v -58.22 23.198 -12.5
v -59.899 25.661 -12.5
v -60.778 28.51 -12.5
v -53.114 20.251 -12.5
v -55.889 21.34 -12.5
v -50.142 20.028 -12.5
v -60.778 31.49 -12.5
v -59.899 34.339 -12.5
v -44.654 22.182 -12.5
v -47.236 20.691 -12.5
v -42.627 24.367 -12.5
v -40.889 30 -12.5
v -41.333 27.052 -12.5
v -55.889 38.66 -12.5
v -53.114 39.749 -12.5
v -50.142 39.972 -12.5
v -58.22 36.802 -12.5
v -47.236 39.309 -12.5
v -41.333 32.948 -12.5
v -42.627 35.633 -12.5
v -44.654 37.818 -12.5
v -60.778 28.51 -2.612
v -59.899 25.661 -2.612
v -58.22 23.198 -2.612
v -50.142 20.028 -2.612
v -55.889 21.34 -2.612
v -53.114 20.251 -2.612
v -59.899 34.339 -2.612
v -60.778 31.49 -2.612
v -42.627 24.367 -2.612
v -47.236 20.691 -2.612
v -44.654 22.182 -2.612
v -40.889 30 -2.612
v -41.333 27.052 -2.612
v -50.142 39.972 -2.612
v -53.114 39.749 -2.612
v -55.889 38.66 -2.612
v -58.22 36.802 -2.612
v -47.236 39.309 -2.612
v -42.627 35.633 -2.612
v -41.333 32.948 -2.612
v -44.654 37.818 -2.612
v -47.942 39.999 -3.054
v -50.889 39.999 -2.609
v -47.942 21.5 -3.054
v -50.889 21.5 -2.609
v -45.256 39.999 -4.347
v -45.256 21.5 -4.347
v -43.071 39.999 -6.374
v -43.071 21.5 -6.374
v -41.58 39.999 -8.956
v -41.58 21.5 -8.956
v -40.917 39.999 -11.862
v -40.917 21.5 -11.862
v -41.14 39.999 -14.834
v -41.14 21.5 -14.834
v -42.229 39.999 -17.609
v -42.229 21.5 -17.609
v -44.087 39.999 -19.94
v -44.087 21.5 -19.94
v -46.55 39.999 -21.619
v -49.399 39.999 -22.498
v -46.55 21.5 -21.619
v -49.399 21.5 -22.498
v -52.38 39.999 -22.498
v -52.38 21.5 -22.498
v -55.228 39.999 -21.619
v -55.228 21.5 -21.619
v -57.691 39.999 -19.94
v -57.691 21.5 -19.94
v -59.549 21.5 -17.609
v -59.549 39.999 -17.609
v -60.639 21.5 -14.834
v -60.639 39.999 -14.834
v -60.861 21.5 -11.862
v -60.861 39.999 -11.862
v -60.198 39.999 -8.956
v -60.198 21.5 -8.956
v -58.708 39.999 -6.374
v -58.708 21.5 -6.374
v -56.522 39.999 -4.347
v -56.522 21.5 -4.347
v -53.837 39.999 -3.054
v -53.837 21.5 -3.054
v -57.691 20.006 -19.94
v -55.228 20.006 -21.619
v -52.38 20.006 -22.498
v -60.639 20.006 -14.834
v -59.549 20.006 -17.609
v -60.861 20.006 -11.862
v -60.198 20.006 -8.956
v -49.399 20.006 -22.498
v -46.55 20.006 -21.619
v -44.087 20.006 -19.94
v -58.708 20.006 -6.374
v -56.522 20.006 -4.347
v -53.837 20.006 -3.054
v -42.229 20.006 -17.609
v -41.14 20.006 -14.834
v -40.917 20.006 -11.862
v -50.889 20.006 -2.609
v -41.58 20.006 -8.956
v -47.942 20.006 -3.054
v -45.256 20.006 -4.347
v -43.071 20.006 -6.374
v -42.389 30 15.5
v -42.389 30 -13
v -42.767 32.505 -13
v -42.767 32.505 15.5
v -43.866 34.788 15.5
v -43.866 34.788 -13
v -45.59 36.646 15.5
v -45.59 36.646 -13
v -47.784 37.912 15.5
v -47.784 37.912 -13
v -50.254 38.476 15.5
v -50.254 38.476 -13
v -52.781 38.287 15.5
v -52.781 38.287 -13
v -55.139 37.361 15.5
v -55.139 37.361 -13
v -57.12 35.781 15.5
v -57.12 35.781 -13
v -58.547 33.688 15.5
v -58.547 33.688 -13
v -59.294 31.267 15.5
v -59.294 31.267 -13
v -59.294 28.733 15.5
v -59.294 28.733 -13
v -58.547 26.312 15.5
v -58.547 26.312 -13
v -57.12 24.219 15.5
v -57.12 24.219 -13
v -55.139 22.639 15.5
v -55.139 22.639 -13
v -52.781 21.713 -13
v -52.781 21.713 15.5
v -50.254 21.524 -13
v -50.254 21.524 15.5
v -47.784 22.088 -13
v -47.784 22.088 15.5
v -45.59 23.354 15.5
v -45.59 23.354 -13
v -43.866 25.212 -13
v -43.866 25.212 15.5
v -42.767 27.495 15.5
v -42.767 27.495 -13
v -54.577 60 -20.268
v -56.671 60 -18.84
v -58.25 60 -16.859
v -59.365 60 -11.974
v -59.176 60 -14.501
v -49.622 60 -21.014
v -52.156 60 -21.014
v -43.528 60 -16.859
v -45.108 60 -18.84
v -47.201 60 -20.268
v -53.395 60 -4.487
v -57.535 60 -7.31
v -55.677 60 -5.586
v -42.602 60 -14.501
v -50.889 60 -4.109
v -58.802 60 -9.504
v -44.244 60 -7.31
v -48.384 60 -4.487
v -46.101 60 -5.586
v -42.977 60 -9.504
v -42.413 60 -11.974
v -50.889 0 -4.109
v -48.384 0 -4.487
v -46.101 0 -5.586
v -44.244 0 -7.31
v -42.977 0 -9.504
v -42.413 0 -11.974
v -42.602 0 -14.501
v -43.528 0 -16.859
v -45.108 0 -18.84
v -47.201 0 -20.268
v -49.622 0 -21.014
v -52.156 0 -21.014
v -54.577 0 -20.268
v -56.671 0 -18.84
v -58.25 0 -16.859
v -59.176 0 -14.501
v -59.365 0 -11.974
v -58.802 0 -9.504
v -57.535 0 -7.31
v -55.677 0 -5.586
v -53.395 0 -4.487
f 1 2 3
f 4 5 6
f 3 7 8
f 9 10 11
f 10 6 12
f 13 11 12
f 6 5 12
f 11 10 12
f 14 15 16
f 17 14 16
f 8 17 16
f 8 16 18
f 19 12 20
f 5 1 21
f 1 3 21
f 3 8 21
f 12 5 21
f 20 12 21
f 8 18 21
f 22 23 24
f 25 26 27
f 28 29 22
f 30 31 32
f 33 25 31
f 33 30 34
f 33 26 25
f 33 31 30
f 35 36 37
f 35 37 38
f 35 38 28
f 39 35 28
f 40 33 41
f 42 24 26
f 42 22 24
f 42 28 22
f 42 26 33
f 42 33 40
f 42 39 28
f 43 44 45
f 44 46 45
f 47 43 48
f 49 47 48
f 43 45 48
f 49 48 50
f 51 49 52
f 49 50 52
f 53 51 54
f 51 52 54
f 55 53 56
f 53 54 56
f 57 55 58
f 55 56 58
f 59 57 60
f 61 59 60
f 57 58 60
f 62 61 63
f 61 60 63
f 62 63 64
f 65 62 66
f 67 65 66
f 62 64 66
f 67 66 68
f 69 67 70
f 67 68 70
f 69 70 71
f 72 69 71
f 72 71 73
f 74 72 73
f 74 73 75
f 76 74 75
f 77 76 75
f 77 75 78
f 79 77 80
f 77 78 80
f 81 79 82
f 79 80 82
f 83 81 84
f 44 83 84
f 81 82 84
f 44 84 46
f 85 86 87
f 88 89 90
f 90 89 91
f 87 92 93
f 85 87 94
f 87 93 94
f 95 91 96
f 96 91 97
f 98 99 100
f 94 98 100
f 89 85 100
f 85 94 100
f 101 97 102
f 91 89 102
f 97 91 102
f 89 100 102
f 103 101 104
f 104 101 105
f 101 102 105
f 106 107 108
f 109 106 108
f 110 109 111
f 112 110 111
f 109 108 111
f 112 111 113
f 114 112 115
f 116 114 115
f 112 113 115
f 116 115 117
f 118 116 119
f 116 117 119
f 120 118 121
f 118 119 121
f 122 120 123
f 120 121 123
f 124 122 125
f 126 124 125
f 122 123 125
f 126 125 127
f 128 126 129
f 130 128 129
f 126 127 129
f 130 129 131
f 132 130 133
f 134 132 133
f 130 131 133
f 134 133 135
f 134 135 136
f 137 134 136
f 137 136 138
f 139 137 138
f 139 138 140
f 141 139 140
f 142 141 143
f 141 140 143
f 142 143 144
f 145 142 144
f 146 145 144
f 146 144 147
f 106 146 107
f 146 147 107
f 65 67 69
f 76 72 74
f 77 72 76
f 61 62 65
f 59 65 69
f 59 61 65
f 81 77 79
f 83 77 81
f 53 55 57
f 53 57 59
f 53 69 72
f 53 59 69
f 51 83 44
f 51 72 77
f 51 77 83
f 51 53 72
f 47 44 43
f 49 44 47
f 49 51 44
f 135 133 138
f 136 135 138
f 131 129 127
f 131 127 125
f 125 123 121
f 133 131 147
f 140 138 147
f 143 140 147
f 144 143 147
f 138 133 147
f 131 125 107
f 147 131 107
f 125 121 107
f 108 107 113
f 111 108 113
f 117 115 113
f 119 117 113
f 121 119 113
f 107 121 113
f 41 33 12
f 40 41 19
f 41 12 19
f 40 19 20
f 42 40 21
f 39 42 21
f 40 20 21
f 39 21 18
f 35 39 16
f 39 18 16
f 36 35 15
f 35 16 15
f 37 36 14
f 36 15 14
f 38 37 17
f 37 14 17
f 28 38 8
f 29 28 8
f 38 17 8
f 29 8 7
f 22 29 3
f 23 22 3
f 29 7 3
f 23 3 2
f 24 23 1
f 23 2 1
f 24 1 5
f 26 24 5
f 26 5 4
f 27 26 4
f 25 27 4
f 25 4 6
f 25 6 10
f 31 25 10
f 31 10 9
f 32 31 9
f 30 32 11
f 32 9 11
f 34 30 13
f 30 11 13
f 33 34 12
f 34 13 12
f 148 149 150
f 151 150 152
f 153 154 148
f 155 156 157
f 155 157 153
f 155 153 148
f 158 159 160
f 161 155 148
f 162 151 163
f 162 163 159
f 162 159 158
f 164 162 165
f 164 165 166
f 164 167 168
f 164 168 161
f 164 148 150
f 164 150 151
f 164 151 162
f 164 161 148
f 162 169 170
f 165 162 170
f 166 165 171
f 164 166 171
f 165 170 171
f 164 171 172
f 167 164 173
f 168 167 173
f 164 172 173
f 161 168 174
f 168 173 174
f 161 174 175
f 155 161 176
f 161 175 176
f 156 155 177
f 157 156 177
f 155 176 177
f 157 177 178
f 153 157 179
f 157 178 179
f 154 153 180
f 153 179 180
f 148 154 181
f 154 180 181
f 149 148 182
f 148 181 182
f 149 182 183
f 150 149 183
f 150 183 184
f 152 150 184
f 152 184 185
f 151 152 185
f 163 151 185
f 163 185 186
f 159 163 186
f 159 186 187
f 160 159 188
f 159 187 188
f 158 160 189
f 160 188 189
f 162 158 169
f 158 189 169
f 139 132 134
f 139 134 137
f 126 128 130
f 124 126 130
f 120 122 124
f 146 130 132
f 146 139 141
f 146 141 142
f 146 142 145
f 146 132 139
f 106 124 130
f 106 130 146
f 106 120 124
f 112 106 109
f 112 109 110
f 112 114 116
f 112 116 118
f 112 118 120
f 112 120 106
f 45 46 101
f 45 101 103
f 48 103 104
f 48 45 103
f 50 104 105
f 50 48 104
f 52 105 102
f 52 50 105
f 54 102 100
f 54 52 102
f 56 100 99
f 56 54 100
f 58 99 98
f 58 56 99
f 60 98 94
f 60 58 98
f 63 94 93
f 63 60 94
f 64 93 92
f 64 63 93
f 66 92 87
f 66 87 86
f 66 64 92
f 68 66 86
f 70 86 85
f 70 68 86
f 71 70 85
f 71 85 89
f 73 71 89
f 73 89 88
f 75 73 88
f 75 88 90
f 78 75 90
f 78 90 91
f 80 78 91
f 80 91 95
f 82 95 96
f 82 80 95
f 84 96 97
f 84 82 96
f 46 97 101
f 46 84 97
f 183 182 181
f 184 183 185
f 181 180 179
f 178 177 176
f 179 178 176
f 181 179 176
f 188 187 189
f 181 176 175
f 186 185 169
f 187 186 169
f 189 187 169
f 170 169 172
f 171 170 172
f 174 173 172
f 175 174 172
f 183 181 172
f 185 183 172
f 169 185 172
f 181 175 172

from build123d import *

# Parameters (mm, degrees)
SKETCH1_R                 = 8.5
BOSS_EXTRUDE9_DEPTH       = 60
BOSS_EXTRUDE10_DEPTH      = 15.5
BOSS_EXTRUDE10_DEPTH_BACK = 13
SKETCH2_R                 = 8.5
BOSS_EXTRUDE11_DEPTH      = 0.0001
BOSS_EXTRUDE11_DEPTH_BACK = 38.5
SKETCH3_R                 = 10
MOVE_FACE1_BY             = 20.2
BOSS_EXTRUDE12_DEPTH      = 0.0001
BOSS_EXTRUDE12_DEPTH_BACK = 28
SKETCH4_R                 = 10
MOVE_FACE2_BY             = 18.6
MOVE_FACE3_BY             = 0.198659162
MOVE_FACE4_BY             = 1.493864333
MOVE_FACE6_BY             = 0.604242716
MOVE_FACE7_BY             = 0.11593398


with BuildPart() as part:
    # Sketch1 → Boss-Extrude9 (new body)
    with BuildSketch(Plane(origin=(0, 0, 0), x_dir=(1, 0, 0), z_dir=(0, 1, 0))):
        with Locations(Location((-50.889224798, 12.609280988, 0), (0, 0, 270))):
            Circle(SKETCH1_R)
    extrude(amount=BOSS_EXTRUDE9_DEPTH)


with BuildPart() as body_2:
    # Sketch2 → Boss-Extrude10 (new, two sides: drawn at the far end of the back side and taken through both)
    with BuildSketch(Plane.XY.offset(-BOSS_EXTRUDE10_DEPTH_BACK)):
        with Locations((-50.889224798, 30)):
            Circle(SKETCH2_R)
    extrude(amount=BOSS_EXTRUDE10_DEPTH + BOSS_EXTRUDE10_DEPTH_BACK)


with BuildPart() as body_3:
    # Sketch3 → Boss-Extrude11 (new, two sides: drawn at the far end of the back side and taken through both)
    with BuildSketch(Plane(origin=(0, 60, 0), x_dir=(1, 0, 0), z_dir=(0, 1, 0)).offset(-BOSS_EXTRUDE11_DEPTH_BACK)):
        with Locations(Location((-50.889224798, 12.609280988, 0), (0, 0, 270))):
            Circle(SKETCH3_R)
    extrude(amount=BOSS_EXTRUDE11_DEPTH + BOSS_EXTRUDE11_DEPTH_BACK)

    # Move Face1: a face moved inward by 20.2
    extrude(body_3.faces().sort_by_distance((-50.889224798, 60.0001, -12.609280988))[0], amount=MOVE_FACE1_BY, dir=(0, -1, 0), mode=Mode.SUBTRACT)

    # Move Face3: a face moved outward by 0.198659
    extrude(body_3.faces().sort_by_distance((-50.889224798, 39.8001, -12.609280988))[0], amount=MOVE_FACE3_BY, dir=(0, 1, 0))

    # Move Face4: a face moved outward by 1.493864
    extrude(body_3.faces().sort_by_distance((-50.889224798, 21.5, -12.609280988))[0], amount=MOVE_FACE4_BY, dir=(0, -1, 0))


with BuildPart() as body_4:
    # Sketch4 → Boss-Extrude12 (new, two sides: drawn at the far end of the back side and taken through both)
    with BuildSketch(Plane.XY.offset(15.5).offset(-BOSS_EXTRUDE12_DEPTH_BACK)):
        with Locations((-50.889224798, 30)):
            Circle(SKETCH4_R)
    extrude(amount=BOSS_EXTRUDE12_DEPTH + BOSS_EXTRUDE12_DEPTH_BACK)

    # Move Face2: a face moved inward by 18.6
    extrude(body_4.faces().sort_by_distance((-50.889224798, 30, 15.5001))[0], amount=MOVE_FACE2_BY, dir=(0, 0, -1), mode=Mode.SUBTRACT)

    # Move Face6: a face moved outward by 0.604243
    extrude(body_4.faces().sort_by_distance((-50.889224798, 30, -3.0999))[0], amount=MOVE_FACE6_BY, dir=(0, 0, 1))

    # Move Face7: a face moved inward by 0.115934
    extrude(body_4.faces().sort_by_distance((-50.889224798, 30, -2.495657284))[0], amount=MOVE_FACE7_BY, dir=(0, 0, -1), mode=Mode.SUBTRACT)


solid = Compound([part.part, body_2.part, body_3.part, body_4.part])
